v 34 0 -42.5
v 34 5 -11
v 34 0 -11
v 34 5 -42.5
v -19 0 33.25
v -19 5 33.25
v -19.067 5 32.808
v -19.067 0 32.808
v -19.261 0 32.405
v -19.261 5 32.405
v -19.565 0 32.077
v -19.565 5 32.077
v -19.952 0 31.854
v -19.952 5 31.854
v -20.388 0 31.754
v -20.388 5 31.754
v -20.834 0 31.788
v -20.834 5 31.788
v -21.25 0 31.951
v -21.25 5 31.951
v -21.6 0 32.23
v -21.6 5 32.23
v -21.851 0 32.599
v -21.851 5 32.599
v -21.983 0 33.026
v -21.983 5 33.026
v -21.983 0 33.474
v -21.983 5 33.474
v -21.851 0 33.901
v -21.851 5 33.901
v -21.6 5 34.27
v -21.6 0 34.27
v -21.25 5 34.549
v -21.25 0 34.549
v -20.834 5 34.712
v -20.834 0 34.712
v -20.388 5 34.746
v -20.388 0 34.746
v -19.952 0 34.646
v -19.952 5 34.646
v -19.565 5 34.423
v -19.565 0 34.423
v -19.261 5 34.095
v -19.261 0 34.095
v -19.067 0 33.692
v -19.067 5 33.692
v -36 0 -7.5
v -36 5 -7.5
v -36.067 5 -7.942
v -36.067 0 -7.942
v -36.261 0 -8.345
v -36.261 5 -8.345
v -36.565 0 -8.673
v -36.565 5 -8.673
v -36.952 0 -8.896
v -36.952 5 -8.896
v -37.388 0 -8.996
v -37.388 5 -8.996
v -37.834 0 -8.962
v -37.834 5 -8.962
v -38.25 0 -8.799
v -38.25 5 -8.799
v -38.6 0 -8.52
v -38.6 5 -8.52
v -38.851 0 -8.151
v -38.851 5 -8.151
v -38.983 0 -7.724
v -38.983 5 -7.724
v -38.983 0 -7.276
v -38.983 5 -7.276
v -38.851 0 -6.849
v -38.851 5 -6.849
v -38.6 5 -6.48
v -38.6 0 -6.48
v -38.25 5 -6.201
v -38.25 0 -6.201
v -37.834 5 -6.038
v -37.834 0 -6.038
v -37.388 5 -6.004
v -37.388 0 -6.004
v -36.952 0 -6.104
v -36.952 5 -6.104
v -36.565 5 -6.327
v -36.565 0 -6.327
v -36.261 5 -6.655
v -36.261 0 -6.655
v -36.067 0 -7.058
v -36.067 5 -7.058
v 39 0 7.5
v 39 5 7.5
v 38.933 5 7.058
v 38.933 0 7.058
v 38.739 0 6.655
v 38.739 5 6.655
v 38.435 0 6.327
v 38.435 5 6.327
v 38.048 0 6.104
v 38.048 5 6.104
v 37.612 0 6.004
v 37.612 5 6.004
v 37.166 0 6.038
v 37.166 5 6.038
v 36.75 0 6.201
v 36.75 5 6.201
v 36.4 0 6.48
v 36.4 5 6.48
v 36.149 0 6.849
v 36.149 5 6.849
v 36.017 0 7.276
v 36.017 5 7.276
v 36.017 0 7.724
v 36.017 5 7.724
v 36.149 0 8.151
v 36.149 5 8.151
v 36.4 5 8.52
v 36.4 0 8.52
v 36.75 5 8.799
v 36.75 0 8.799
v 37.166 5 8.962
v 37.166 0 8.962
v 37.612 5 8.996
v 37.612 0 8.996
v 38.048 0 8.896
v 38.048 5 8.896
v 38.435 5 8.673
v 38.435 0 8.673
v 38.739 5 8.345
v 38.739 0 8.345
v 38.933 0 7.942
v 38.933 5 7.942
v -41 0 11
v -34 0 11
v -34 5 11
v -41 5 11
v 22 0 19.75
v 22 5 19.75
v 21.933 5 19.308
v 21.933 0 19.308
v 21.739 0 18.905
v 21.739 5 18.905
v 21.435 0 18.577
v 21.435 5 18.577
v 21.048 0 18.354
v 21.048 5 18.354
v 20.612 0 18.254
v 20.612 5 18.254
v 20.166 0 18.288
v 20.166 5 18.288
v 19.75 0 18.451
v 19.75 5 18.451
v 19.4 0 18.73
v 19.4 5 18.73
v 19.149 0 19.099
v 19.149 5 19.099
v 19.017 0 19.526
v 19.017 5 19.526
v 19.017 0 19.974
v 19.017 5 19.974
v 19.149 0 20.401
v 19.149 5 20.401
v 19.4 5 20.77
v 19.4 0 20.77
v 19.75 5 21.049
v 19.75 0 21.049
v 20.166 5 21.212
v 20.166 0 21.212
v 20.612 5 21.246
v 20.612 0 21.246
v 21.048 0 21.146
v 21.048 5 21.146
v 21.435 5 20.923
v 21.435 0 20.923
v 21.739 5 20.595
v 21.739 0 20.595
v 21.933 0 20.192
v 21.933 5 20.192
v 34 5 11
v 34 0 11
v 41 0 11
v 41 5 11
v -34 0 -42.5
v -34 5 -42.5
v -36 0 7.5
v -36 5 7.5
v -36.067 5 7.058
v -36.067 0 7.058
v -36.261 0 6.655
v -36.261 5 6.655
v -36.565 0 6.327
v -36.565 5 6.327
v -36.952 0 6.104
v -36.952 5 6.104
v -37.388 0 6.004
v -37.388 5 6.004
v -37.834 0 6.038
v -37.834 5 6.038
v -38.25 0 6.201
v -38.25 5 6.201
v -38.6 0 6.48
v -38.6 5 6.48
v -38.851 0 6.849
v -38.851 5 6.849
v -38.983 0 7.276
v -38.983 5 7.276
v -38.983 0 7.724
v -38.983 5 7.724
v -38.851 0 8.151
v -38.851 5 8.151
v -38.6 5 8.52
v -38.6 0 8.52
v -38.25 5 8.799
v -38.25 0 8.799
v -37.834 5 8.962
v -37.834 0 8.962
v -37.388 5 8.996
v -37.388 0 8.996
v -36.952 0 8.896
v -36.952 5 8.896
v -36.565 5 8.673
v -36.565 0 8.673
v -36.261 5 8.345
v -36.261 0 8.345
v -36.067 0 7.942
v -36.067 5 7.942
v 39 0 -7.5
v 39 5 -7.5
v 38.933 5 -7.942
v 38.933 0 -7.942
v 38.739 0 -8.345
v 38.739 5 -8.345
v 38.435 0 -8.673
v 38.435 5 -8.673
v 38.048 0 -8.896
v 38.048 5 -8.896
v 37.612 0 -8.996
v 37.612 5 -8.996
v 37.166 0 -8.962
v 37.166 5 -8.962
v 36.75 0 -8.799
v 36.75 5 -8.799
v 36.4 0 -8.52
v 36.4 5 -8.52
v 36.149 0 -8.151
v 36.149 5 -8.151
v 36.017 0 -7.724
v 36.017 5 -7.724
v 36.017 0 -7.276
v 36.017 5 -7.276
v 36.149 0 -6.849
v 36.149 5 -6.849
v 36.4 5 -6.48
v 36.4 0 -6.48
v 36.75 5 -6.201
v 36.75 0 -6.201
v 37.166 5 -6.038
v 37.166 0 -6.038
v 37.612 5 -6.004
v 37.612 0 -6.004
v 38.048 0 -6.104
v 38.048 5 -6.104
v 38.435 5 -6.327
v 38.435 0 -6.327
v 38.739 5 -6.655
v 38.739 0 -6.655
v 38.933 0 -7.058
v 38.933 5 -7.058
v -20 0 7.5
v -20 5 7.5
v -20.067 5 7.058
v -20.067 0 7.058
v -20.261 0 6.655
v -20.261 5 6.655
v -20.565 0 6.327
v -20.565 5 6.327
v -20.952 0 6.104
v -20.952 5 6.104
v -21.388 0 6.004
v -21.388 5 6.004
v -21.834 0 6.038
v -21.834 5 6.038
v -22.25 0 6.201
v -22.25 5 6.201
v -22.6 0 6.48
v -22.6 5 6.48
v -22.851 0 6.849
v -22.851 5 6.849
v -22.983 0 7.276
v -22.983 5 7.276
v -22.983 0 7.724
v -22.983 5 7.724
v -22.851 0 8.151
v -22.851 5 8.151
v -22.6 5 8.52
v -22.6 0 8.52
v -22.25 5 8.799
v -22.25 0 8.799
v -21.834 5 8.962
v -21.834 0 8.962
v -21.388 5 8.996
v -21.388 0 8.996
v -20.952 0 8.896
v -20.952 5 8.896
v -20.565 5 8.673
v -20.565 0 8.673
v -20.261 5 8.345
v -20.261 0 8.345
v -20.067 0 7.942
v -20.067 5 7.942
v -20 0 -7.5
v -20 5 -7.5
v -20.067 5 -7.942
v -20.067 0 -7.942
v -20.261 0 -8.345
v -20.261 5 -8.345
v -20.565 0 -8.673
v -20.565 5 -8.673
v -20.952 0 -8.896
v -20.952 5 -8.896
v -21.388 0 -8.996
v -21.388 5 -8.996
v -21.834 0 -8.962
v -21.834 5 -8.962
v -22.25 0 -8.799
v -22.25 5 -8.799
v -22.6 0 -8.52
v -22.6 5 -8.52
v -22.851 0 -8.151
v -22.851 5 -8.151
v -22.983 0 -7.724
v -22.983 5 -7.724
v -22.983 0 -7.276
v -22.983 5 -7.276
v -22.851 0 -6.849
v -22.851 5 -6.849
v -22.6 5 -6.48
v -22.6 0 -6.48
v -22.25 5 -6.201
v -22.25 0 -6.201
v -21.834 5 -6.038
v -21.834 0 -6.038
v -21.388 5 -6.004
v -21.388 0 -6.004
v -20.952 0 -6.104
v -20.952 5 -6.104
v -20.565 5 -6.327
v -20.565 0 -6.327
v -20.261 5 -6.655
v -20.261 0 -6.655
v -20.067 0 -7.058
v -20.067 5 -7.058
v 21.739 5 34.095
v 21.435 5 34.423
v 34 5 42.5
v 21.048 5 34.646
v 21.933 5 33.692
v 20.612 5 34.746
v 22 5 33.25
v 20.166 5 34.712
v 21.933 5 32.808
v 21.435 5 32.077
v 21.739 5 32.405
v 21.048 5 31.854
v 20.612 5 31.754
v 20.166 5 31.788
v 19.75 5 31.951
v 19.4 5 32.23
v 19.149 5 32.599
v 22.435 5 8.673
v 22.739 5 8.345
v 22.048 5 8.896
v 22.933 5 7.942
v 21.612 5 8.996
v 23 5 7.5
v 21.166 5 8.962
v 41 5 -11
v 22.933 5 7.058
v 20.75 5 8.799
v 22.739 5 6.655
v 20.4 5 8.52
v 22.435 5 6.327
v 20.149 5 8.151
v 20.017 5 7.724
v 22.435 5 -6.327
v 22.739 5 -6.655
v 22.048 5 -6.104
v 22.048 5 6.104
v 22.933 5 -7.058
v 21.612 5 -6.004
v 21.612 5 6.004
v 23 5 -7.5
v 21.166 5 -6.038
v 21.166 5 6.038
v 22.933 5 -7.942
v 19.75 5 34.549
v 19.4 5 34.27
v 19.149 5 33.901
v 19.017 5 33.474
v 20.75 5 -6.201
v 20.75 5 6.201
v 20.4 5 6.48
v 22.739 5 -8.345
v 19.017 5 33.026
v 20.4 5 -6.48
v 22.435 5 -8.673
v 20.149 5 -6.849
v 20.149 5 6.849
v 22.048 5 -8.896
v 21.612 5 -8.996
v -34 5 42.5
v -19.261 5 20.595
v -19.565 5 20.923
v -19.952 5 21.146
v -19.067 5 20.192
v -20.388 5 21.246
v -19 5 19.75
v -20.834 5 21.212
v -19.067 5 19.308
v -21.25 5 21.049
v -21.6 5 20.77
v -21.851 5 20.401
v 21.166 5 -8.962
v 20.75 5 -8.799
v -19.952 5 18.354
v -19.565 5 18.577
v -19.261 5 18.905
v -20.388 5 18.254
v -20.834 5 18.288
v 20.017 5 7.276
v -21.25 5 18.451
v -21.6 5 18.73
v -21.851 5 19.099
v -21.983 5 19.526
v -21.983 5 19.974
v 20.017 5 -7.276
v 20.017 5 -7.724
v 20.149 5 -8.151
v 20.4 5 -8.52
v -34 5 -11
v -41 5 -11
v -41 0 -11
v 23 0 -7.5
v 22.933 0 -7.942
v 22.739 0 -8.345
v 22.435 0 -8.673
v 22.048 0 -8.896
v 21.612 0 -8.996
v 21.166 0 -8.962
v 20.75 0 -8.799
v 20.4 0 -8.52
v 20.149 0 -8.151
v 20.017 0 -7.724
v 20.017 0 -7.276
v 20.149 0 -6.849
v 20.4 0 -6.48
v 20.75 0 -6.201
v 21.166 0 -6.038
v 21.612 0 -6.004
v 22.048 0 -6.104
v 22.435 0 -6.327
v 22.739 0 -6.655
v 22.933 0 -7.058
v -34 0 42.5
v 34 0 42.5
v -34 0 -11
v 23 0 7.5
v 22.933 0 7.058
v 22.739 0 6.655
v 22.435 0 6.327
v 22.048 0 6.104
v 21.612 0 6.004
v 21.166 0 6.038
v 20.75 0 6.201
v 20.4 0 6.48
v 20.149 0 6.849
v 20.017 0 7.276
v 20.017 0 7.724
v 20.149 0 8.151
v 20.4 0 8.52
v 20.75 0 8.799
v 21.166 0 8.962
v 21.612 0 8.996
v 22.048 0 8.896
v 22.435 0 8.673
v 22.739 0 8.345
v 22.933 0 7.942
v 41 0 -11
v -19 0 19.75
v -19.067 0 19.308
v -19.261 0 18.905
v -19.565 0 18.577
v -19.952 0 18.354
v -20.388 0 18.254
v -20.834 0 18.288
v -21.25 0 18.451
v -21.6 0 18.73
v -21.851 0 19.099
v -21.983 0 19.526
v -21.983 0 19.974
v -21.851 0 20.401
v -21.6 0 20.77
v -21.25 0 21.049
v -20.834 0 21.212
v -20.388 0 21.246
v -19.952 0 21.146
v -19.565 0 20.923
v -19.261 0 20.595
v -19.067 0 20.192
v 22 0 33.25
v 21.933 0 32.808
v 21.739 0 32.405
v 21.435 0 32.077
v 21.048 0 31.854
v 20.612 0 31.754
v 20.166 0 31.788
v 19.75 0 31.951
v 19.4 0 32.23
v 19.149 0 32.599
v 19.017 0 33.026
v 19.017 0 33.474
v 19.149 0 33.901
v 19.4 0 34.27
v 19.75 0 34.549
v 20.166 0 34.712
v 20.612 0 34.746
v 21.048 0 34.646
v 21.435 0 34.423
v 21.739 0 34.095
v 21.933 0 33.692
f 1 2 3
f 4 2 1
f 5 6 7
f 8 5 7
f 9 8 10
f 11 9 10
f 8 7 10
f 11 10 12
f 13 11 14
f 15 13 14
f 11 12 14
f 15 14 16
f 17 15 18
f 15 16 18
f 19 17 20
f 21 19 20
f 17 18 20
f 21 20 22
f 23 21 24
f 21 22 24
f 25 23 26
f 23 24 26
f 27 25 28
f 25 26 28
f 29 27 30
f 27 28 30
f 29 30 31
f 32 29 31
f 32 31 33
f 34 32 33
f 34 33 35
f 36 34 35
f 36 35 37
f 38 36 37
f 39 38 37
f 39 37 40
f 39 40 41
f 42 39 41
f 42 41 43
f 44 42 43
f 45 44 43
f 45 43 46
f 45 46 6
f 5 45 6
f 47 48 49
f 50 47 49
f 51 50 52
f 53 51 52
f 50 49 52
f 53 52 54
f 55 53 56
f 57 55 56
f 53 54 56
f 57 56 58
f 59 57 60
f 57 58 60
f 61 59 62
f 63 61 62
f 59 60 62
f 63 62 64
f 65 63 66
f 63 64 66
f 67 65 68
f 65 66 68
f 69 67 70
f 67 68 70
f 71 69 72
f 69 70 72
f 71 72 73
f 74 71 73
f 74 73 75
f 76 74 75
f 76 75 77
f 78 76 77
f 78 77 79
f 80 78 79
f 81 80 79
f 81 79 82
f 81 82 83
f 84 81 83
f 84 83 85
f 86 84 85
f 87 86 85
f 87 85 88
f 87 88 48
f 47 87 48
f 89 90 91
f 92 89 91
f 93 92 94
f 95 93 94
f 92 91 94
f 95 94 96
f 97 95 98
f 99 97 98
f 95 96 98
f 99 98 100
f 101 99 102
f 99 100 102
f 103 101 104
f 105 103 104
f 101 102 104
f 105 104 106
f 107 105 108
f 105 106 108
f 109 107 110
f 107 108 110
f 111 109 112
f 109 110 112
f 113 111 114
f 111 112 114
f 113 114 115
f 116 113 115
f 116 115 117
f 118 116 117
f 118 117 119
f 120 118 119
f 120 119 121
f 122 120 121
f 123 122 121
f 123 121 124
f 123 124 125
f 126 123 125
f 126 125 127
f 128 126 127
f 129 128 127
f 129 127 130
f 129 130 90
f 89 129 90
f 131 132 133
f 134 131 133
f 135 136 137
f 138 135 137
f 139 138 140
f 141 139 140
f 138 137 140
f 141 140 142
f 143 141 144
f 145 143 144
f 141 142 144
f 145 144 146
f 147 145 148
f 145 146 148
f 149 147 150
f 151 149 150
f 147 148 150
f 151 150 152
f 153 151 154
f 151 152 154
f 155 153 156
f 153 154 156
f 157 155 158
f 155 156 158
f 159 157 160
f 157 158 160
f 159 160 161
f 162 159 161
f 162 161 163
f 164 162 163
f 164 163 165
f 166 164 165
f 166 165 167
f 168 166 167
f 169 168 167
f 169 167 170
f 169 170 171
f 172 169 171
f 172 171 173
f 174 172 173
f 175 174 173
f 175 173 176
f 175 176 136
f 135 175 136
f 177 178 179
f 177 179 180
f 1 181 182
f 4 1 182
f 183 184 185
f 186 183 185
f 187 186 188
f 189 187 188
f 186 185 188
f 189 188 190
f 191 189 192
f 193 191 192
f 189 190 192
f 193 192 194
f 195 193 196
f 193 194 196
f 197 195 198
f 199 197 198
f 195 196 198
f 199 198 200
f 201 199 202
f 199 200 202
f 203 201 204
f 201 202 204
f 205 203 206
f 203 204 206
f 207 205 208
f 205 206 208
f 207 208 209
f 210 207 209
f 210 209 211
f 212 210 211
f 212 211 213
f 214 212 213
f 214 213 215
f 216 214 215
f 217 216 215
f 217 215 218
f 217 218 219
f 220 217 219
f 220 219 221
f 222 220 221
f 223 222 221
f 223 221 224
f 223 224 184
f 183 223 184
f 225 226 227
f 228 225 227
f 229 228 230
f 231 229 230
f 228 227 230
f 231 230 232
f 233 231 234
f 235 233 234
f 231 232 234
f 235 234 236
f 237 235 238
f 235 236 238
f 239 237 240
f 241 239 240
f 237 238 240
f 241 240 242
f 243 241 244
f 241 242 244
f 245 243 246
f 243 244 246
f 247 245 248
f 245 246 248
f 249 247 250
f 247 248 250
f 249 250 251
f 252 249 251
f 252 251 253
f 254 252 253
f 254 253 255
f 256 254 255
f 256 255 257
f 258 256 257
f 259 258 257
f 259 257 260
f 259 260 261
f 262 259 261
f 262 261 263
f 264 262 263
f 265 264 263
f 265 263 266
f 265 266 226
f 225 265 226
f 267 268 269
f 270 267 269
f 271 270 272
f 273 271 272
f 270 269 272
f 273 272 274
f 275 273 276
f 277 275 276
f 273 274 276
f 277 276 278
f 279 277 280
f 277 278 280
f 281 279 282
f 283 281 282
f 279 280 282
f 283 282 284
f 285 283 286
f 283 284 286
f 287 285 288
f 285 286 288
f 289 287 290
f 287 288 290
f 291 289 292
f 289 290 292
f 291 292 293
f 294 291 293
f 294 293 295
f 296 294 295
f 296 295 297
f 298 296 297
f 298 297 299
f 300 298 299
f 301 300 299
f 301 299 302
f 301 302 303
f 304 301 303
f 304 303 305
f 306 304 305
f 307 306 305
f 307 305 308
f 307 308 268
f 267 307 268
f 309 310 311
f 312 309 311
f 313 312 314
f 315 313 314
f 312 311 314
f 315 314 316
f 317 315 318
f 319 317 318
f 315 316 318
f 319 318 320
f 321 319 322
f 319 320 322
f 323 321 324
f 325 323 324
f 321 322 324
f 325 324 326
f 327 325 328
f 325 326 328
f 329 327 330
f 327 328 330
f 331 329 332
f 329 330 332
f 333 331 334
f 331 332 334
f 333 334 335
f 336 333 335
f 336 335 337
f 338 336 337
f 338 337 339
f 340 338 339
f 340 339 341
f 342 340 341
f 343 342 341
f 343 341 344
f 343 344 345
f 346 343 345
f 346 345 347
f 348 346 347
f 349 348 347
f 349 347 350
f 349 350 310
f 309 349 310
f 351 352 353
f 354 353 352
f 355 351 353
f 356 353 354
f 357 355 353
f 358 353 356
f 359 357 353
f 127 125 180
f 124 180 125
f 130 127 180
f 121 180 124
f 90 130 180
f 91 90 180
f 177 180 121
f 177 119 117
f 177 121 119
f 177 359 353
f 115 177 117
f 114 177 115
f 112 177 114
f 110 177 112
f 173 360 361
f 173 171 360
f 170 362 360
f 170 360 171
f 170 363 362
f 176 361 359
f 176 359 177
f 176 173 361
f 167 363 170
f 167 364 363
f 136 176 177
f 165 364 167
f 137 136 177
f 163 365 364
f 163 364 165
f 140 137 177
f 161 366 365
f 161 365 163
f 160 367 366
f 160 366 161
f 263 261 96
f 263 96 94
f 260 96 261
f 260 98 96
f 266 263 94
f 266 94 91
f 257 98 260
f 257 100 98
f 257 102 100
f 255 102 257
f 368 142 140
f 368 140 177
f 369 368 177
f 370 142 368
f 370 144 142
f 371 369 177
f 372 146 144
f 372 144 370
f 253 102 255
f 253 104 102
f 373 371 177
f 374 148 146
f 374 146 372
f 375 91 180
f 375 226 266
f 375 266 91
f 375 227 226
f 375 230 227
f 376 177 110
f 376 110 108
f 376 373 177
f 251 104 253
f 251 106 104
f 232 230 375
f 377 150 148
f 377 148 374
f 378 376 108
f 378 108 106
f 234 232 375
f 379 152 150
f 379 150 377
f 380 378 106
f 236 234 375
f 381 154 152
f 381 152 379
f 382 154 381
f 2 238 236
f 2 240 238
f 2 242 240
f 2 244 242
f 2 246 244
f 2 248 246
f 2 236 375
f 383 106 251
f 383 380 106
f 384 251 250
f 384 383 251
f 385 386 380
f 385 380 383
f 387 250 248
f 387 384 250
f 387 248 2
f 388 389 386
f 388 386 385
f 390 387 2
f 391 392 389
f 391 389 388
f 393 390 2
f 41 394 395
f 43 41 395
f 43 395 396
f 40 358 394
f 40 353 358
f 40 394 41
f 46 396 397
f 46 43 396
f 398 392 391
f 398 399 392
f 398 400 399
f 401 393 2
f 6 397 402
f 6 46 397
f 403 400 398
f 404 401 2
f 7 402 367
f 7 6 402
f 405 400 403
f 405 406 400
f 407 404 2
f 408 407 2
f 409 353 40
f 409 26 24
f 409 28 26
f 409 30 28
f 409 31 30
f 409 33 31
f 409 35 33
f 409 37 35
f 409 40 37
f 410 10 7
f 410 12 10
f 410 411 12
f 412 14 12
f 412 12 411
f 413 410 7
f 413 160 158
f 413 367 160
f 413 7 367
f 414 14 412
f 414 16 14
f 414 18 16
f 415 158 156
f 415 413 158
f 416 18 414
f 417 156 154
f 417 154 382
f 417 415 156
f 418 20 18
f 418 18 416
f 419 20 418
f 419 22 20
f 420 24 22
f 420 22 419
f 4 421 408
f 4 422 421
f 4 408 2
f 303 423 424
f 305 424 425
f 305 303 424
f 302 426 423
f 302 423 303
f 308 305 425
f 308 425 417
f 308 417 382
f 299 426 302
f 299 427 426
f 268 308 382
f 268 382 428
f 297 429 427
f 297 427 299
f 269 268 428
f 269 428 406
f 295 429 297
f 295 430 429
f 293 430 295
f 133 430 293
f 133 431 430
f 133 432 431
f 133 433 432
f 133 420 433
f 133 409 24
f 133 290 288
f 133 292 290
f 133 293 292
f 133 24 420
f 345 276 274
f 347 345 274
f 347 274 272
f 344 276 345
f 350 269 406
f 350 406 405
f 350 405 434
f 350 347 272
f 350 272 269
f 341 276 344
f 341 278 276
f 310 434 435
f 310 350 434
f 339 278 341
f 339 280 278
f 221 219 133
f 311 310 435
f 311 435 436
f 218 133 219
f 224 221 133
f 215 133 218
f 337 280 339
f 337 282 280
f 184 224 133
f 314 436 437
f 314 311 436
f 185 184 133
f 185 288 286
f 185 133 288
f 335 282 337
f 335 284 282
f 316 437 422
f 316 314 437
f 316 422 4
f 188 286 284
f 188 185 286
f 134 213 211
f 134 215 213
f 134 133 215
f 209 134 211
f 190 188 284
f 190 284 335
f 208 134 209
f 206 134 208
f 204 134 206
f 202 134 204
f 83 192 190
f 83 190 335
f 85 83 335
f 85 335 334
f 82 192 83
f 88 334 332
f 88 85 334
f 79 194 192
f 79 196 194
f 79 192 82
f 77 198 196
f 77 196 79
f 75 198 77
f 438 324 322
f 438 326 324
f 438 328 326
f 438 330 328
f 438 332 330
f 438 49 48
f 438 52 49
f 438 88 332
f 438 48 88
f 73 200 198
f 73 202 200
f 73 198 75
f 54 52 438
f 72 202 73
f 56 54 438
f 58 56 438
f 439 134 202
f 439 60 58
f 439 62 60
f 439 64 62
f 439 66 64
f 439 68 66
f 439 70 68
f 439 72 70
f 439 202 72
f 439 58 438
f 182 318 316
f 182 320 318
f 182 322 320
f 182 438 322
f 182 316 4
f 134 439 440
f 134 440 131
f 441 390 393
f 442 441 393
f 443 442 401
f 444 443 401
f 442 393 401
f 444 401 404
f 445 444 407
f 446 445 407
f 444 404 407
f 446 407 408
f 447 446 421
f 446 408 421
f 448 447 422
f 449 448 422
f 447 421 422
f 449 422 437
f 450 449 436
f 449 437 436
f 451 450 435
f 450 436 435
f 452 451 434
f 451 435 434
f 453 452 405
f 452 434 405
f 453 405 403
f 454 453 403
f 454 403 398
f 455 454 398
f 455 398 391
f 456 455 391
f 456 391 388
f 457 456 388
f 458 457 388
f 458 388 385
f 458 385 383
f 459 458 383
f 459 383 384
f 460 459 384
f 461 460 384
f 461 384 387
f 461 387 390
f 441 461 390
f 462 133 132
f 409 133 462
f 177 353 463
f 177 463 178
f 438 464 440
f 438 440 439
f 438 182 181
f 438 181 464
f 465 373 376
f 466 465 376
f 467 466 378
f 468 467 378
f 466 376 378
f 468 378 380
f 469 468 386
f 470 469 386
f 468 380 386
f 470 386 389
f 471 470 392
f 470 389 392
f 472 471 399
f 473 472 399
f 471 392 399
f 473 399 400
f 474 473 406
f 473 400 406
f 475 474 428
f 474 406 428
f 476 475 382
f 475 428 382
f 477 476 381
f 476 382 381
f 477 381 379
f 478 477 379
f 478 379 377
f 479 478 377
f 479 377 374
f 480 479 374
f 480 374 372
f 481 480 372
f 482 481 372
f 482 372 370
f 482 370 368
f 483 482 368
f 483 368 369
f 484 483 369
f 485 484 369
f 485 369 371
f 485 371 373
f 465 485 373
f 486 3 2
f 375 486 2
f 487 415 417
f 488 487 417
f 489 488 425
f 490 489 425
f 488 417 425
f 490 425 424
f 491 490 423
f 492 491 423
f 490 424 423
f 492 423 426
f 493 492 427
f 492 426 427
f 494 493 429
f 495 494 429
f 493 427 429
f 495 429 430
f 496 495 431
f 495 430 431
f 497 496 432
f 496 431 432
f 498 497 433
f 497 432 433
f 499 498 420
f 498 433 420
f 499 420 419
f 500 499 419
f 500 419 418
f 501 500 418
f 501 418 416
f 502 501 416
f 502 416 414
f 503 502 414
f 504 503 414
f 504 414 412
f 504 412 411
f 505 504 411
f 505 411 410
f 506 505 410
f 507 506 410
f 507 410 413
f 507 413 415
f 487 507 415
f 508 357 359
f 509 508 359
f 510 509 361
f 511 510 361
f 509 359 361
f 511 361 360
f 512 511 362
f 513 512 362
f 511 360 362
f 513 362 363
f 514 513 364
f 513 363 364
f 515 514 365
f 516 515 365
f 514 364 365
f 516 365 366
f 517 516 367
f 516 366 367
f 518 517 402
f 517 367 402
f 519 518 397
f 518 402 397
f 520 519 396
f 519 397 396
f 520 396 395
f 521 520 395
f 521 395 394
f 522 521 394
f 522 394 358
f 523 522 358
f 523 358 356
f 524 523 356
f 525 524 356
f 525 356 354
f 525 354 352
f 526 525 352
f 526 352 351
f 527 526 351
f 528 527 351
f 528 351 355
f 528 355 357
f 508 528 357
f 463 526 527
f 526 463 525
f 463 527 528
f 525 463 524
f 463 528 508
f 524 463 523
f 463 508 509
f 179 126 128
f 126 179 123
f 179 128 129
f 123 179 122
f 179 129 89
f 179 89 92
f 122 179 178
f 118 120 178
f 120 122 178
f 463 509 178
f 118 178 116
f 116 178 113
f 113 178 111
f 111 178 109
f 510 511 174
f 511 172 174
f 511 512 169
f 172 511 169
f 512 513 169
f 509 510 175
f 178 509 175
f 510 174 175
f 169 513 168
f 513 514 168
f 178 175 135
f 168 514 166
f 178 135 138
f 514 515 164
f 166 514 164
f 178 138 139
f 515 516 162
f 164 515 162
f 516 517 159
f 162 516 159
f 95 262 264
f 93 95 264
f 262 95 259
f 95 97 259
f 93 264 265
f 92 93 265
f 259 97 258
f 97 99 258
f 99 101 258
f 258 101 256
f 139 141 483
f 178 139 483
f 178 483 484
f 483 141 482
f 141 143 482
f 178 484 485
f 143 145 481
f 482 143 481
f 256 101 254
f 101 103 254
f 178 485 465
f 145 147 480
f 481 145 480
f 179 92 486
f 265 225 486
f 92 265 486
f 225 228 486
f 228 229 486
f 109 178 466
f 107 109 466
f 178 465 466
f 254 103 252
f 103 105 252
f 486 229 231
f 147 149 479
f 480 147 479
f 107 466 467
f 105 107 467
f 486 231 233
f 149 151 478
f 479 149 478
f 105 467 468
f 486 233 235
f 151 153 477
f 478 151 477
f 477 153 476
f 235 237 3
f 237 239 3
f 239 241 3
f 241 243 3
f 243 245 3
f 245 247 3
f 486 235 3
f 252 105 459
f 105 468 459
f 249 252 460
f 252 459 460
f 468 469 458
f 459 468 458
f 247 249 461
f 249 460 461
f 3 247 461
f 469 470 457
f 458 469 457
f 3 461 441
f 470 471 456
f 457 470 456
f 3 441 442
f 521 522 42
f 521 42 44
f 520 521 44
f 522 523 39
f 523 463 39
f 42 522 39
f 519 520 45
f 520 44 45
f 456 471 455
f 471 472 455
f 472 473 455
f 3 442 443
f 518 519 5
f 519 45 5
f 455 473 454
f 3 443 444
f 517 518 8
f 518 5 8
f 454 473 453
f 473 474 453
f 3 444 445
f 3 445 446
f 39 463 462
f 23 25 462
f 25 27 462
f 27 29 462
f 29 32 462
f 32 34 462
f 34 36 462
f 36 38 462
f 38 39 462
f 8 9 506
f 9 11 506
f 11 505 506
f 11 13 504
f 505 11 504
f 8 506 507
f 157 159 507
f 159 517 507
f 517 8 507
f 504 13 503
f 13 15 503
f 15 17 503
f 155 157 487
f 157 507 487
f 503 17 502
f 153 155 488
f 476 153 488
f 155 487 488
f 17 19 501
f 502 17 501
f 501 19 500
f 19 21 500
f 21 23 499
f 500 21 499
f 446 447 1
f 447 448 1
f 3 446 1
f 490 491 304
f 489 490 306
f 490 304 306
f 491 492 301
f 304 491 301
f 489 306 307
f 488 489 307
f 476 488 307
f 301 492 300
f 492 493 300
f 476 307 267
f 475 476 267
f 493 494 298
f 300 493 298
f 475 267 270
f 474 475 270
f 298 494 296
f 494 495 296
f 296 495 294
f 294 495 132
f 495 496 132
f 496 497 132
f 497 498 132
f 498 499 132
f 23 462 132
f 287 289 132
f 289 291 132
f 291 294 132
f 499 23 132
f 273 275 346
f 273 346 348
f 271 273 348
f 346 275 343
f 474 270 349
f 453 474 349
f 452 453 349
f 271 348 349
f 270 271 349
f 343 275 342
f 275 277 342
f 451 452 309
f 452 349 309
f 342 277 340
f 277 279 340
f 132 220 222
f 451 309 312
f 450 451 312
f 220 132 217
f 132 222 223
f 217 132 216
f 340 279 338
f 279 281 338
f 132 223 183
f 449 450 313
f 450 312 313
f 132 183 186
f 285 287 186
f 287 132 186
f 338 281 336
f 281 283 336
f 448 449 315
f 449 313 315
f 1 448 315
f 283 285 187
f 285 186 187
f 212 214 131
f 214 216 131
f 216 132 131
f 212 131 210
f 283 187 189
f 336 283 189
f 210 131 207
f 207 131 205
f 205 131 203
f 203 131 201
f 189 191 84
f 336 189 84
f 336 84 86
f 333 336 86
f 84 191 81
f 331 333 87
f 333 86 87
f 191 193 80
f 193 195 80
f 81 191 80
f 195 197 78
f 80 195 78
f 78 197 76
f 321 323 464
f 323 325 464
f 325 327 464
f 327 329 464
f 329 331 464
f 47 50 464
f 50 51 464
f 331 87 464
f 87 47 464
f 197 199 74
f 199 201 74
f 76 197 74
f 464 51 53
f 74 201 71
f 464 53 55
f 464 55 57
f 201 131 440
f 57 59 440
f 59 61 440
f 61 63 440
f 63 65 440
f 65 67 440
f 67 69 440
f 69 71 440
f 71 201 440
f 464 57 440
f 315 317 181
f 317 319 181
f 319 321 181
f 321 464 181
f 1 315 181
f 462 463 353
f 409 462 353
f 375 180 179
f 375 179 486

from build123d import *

# Parameters (mm, degrees)
SKETCH1_W           = 66
SKETCH1_H           = 85
BOSS_EXTRUDE1_DEPTH = 5
SKETCH5_W           = 22
SKETCH5_H           = 5
BOSS_EXTRUDE2_DEPTH = 7
SKETCH4_R           = 1.5
CUT_EXTRUDE2_DEPTH  = 10
SKETCH7_W           = 22
SKETCH7_H           = 5
BOSS_EXTRUDE3_DEPTH = 1
SKETCH8_W           = 22
SKETCH8_H           = 5
BOSS_EXTRUDE4_DEPTH = 1
SKETCH9_W           = 85
SKETCH9_H           = 5
BOSS_EXTRUDE5_DEPTH = 1
SKETCH10_W          = 85
SKETCH10_H          = 5
BOSS_EXTRUDE6_DEPTH = 1
SKETCH11_R          = 1.5
CUT_EXTRUDE3_DEPTH  = 10


with BuildPart() as part:
    # Sketch1 → Boss-Extrude1 (new body)
    with BuildSketch(Plane(origin=(0, 0, 0), x_dir=(1, 0, 0), z_dir=(0, 1, 0))):
        Rectangle(SKETCH1_W, SKETCH1_H)
    extrude(amount=BOSS_EXTRUDE1_DEPTH)

    # Sketch5 → Boss-Extrude2 (add)
    with BuildSketch(Plane.ZY.offset(33)):
        with Locations((0, 2.5)):
            Rectangle(SKETCH5_W, SKETCH5_H)
    boss_extrude2 = extrude(amount=BOSS_EXTRUDE2_DEPTH)

    # Mirror1: Boss-Extrude2 across plane
    add(boss_extrude2.mirror(Plane.ZY))

    # Sketch4 → Cut-Extrude2 (cut)
    with BuildSketch(Plane(origin=(0, 5, 0), x_dir=(1, 0, 0), z_dir=(0, 1, 0))):
        with Locations((-37.5, 7.5)):
            Circle(SKETCH4_R)
        with Locations((-21.5, 7.5)):
            Circle(SKETCH4_R)
        with Locations((-37.5, -7.5)):
            Circle(SKETCH4_R)
        with Locations((-21.5, -7.5)):
            Circle(SKETCH4_R)
        with Locations((21.5, -7.5)):
            Circle(SKETCH4_R)
        with Locations((37.5, -7.5)):
            Circle(SKETCH4_R)
        with Locations((21.5, 7.5)):
            Circle(SKETCH4_R)
        with Locations((37.5, 7.5)):
            Circle(SKETCH4_R)
    extrude(amount=-CUT_EXTRUDE2_DEPTH, mode=Mode.SUBTRACT)

    # Sketch7 → Boss-Extrude3 (add)
    with BuildSketch(Plane.ZY.offset(40)):
        with Locations((0, 2.5)):
            Rectangle(SKETCH7_W, SKETCH7_H)
    extrude(amount=BOSS_EXTRUDE3_DEPTH)

    # Sketch8 → Boss-Extrude4 (add)
    with BuildSketch(Plane(origin=(40, 0, 0), x_dir=(0, 0, -1), z_dir=(1, 0, 0))):
        with Locations((0, 2.5)):
            Rectangle(SKETCH8_W, SKETCH8_H)
    extrude(amount=BOSS_EXTRUDE4_DEPTH)

    # Sketch9 → Boss-Extrude5 (add)
    with BuildSketch(Plane.ZY.offset(33)):
        with Locations((0, 2.5)):
            Rectangle(SKETCH9_W, SKETCH9_H)
    extrude(amount=BOSS_EXTRUDE5_DEPTH)

    # Sketch10 → Boss-Extrude6 (add)
    with BuildSketch(Plane(origin=(33, 0, 0), x_dir=(0, 0, -1), z_dir=(1, 0, 0))):
        with Locations((0, 2.5)):
            Rectangle(SKETCH10_W, SKETCH10_H)
    extrude(amount=BOSS_EXTRUDE6_DEPTH)

    # Sketch11 → Cut-Extrude3 (cut)
    with BuildSketch(Plane(origin=(0, 5, 0), x_dir=(1, 0, 0), z_dir=(0, 1, 0))):
        with Locations((-20.5, -33.25)):
            Circle(SKETCH11_R)
        with Locations((-20.5, -19.75)):
            Circle(SKETCH11_R)
        with Locations((20.5, -33.25)):
            Circle(SKETCH11_R)
        with Locations((20.5, -19.75)):
            Circle(SKETCH11_R)
    extrude(amount=-CUT_EXTRUDE3_DEPTH, mode=Mode.SUBTRACT)


solid = part.part
